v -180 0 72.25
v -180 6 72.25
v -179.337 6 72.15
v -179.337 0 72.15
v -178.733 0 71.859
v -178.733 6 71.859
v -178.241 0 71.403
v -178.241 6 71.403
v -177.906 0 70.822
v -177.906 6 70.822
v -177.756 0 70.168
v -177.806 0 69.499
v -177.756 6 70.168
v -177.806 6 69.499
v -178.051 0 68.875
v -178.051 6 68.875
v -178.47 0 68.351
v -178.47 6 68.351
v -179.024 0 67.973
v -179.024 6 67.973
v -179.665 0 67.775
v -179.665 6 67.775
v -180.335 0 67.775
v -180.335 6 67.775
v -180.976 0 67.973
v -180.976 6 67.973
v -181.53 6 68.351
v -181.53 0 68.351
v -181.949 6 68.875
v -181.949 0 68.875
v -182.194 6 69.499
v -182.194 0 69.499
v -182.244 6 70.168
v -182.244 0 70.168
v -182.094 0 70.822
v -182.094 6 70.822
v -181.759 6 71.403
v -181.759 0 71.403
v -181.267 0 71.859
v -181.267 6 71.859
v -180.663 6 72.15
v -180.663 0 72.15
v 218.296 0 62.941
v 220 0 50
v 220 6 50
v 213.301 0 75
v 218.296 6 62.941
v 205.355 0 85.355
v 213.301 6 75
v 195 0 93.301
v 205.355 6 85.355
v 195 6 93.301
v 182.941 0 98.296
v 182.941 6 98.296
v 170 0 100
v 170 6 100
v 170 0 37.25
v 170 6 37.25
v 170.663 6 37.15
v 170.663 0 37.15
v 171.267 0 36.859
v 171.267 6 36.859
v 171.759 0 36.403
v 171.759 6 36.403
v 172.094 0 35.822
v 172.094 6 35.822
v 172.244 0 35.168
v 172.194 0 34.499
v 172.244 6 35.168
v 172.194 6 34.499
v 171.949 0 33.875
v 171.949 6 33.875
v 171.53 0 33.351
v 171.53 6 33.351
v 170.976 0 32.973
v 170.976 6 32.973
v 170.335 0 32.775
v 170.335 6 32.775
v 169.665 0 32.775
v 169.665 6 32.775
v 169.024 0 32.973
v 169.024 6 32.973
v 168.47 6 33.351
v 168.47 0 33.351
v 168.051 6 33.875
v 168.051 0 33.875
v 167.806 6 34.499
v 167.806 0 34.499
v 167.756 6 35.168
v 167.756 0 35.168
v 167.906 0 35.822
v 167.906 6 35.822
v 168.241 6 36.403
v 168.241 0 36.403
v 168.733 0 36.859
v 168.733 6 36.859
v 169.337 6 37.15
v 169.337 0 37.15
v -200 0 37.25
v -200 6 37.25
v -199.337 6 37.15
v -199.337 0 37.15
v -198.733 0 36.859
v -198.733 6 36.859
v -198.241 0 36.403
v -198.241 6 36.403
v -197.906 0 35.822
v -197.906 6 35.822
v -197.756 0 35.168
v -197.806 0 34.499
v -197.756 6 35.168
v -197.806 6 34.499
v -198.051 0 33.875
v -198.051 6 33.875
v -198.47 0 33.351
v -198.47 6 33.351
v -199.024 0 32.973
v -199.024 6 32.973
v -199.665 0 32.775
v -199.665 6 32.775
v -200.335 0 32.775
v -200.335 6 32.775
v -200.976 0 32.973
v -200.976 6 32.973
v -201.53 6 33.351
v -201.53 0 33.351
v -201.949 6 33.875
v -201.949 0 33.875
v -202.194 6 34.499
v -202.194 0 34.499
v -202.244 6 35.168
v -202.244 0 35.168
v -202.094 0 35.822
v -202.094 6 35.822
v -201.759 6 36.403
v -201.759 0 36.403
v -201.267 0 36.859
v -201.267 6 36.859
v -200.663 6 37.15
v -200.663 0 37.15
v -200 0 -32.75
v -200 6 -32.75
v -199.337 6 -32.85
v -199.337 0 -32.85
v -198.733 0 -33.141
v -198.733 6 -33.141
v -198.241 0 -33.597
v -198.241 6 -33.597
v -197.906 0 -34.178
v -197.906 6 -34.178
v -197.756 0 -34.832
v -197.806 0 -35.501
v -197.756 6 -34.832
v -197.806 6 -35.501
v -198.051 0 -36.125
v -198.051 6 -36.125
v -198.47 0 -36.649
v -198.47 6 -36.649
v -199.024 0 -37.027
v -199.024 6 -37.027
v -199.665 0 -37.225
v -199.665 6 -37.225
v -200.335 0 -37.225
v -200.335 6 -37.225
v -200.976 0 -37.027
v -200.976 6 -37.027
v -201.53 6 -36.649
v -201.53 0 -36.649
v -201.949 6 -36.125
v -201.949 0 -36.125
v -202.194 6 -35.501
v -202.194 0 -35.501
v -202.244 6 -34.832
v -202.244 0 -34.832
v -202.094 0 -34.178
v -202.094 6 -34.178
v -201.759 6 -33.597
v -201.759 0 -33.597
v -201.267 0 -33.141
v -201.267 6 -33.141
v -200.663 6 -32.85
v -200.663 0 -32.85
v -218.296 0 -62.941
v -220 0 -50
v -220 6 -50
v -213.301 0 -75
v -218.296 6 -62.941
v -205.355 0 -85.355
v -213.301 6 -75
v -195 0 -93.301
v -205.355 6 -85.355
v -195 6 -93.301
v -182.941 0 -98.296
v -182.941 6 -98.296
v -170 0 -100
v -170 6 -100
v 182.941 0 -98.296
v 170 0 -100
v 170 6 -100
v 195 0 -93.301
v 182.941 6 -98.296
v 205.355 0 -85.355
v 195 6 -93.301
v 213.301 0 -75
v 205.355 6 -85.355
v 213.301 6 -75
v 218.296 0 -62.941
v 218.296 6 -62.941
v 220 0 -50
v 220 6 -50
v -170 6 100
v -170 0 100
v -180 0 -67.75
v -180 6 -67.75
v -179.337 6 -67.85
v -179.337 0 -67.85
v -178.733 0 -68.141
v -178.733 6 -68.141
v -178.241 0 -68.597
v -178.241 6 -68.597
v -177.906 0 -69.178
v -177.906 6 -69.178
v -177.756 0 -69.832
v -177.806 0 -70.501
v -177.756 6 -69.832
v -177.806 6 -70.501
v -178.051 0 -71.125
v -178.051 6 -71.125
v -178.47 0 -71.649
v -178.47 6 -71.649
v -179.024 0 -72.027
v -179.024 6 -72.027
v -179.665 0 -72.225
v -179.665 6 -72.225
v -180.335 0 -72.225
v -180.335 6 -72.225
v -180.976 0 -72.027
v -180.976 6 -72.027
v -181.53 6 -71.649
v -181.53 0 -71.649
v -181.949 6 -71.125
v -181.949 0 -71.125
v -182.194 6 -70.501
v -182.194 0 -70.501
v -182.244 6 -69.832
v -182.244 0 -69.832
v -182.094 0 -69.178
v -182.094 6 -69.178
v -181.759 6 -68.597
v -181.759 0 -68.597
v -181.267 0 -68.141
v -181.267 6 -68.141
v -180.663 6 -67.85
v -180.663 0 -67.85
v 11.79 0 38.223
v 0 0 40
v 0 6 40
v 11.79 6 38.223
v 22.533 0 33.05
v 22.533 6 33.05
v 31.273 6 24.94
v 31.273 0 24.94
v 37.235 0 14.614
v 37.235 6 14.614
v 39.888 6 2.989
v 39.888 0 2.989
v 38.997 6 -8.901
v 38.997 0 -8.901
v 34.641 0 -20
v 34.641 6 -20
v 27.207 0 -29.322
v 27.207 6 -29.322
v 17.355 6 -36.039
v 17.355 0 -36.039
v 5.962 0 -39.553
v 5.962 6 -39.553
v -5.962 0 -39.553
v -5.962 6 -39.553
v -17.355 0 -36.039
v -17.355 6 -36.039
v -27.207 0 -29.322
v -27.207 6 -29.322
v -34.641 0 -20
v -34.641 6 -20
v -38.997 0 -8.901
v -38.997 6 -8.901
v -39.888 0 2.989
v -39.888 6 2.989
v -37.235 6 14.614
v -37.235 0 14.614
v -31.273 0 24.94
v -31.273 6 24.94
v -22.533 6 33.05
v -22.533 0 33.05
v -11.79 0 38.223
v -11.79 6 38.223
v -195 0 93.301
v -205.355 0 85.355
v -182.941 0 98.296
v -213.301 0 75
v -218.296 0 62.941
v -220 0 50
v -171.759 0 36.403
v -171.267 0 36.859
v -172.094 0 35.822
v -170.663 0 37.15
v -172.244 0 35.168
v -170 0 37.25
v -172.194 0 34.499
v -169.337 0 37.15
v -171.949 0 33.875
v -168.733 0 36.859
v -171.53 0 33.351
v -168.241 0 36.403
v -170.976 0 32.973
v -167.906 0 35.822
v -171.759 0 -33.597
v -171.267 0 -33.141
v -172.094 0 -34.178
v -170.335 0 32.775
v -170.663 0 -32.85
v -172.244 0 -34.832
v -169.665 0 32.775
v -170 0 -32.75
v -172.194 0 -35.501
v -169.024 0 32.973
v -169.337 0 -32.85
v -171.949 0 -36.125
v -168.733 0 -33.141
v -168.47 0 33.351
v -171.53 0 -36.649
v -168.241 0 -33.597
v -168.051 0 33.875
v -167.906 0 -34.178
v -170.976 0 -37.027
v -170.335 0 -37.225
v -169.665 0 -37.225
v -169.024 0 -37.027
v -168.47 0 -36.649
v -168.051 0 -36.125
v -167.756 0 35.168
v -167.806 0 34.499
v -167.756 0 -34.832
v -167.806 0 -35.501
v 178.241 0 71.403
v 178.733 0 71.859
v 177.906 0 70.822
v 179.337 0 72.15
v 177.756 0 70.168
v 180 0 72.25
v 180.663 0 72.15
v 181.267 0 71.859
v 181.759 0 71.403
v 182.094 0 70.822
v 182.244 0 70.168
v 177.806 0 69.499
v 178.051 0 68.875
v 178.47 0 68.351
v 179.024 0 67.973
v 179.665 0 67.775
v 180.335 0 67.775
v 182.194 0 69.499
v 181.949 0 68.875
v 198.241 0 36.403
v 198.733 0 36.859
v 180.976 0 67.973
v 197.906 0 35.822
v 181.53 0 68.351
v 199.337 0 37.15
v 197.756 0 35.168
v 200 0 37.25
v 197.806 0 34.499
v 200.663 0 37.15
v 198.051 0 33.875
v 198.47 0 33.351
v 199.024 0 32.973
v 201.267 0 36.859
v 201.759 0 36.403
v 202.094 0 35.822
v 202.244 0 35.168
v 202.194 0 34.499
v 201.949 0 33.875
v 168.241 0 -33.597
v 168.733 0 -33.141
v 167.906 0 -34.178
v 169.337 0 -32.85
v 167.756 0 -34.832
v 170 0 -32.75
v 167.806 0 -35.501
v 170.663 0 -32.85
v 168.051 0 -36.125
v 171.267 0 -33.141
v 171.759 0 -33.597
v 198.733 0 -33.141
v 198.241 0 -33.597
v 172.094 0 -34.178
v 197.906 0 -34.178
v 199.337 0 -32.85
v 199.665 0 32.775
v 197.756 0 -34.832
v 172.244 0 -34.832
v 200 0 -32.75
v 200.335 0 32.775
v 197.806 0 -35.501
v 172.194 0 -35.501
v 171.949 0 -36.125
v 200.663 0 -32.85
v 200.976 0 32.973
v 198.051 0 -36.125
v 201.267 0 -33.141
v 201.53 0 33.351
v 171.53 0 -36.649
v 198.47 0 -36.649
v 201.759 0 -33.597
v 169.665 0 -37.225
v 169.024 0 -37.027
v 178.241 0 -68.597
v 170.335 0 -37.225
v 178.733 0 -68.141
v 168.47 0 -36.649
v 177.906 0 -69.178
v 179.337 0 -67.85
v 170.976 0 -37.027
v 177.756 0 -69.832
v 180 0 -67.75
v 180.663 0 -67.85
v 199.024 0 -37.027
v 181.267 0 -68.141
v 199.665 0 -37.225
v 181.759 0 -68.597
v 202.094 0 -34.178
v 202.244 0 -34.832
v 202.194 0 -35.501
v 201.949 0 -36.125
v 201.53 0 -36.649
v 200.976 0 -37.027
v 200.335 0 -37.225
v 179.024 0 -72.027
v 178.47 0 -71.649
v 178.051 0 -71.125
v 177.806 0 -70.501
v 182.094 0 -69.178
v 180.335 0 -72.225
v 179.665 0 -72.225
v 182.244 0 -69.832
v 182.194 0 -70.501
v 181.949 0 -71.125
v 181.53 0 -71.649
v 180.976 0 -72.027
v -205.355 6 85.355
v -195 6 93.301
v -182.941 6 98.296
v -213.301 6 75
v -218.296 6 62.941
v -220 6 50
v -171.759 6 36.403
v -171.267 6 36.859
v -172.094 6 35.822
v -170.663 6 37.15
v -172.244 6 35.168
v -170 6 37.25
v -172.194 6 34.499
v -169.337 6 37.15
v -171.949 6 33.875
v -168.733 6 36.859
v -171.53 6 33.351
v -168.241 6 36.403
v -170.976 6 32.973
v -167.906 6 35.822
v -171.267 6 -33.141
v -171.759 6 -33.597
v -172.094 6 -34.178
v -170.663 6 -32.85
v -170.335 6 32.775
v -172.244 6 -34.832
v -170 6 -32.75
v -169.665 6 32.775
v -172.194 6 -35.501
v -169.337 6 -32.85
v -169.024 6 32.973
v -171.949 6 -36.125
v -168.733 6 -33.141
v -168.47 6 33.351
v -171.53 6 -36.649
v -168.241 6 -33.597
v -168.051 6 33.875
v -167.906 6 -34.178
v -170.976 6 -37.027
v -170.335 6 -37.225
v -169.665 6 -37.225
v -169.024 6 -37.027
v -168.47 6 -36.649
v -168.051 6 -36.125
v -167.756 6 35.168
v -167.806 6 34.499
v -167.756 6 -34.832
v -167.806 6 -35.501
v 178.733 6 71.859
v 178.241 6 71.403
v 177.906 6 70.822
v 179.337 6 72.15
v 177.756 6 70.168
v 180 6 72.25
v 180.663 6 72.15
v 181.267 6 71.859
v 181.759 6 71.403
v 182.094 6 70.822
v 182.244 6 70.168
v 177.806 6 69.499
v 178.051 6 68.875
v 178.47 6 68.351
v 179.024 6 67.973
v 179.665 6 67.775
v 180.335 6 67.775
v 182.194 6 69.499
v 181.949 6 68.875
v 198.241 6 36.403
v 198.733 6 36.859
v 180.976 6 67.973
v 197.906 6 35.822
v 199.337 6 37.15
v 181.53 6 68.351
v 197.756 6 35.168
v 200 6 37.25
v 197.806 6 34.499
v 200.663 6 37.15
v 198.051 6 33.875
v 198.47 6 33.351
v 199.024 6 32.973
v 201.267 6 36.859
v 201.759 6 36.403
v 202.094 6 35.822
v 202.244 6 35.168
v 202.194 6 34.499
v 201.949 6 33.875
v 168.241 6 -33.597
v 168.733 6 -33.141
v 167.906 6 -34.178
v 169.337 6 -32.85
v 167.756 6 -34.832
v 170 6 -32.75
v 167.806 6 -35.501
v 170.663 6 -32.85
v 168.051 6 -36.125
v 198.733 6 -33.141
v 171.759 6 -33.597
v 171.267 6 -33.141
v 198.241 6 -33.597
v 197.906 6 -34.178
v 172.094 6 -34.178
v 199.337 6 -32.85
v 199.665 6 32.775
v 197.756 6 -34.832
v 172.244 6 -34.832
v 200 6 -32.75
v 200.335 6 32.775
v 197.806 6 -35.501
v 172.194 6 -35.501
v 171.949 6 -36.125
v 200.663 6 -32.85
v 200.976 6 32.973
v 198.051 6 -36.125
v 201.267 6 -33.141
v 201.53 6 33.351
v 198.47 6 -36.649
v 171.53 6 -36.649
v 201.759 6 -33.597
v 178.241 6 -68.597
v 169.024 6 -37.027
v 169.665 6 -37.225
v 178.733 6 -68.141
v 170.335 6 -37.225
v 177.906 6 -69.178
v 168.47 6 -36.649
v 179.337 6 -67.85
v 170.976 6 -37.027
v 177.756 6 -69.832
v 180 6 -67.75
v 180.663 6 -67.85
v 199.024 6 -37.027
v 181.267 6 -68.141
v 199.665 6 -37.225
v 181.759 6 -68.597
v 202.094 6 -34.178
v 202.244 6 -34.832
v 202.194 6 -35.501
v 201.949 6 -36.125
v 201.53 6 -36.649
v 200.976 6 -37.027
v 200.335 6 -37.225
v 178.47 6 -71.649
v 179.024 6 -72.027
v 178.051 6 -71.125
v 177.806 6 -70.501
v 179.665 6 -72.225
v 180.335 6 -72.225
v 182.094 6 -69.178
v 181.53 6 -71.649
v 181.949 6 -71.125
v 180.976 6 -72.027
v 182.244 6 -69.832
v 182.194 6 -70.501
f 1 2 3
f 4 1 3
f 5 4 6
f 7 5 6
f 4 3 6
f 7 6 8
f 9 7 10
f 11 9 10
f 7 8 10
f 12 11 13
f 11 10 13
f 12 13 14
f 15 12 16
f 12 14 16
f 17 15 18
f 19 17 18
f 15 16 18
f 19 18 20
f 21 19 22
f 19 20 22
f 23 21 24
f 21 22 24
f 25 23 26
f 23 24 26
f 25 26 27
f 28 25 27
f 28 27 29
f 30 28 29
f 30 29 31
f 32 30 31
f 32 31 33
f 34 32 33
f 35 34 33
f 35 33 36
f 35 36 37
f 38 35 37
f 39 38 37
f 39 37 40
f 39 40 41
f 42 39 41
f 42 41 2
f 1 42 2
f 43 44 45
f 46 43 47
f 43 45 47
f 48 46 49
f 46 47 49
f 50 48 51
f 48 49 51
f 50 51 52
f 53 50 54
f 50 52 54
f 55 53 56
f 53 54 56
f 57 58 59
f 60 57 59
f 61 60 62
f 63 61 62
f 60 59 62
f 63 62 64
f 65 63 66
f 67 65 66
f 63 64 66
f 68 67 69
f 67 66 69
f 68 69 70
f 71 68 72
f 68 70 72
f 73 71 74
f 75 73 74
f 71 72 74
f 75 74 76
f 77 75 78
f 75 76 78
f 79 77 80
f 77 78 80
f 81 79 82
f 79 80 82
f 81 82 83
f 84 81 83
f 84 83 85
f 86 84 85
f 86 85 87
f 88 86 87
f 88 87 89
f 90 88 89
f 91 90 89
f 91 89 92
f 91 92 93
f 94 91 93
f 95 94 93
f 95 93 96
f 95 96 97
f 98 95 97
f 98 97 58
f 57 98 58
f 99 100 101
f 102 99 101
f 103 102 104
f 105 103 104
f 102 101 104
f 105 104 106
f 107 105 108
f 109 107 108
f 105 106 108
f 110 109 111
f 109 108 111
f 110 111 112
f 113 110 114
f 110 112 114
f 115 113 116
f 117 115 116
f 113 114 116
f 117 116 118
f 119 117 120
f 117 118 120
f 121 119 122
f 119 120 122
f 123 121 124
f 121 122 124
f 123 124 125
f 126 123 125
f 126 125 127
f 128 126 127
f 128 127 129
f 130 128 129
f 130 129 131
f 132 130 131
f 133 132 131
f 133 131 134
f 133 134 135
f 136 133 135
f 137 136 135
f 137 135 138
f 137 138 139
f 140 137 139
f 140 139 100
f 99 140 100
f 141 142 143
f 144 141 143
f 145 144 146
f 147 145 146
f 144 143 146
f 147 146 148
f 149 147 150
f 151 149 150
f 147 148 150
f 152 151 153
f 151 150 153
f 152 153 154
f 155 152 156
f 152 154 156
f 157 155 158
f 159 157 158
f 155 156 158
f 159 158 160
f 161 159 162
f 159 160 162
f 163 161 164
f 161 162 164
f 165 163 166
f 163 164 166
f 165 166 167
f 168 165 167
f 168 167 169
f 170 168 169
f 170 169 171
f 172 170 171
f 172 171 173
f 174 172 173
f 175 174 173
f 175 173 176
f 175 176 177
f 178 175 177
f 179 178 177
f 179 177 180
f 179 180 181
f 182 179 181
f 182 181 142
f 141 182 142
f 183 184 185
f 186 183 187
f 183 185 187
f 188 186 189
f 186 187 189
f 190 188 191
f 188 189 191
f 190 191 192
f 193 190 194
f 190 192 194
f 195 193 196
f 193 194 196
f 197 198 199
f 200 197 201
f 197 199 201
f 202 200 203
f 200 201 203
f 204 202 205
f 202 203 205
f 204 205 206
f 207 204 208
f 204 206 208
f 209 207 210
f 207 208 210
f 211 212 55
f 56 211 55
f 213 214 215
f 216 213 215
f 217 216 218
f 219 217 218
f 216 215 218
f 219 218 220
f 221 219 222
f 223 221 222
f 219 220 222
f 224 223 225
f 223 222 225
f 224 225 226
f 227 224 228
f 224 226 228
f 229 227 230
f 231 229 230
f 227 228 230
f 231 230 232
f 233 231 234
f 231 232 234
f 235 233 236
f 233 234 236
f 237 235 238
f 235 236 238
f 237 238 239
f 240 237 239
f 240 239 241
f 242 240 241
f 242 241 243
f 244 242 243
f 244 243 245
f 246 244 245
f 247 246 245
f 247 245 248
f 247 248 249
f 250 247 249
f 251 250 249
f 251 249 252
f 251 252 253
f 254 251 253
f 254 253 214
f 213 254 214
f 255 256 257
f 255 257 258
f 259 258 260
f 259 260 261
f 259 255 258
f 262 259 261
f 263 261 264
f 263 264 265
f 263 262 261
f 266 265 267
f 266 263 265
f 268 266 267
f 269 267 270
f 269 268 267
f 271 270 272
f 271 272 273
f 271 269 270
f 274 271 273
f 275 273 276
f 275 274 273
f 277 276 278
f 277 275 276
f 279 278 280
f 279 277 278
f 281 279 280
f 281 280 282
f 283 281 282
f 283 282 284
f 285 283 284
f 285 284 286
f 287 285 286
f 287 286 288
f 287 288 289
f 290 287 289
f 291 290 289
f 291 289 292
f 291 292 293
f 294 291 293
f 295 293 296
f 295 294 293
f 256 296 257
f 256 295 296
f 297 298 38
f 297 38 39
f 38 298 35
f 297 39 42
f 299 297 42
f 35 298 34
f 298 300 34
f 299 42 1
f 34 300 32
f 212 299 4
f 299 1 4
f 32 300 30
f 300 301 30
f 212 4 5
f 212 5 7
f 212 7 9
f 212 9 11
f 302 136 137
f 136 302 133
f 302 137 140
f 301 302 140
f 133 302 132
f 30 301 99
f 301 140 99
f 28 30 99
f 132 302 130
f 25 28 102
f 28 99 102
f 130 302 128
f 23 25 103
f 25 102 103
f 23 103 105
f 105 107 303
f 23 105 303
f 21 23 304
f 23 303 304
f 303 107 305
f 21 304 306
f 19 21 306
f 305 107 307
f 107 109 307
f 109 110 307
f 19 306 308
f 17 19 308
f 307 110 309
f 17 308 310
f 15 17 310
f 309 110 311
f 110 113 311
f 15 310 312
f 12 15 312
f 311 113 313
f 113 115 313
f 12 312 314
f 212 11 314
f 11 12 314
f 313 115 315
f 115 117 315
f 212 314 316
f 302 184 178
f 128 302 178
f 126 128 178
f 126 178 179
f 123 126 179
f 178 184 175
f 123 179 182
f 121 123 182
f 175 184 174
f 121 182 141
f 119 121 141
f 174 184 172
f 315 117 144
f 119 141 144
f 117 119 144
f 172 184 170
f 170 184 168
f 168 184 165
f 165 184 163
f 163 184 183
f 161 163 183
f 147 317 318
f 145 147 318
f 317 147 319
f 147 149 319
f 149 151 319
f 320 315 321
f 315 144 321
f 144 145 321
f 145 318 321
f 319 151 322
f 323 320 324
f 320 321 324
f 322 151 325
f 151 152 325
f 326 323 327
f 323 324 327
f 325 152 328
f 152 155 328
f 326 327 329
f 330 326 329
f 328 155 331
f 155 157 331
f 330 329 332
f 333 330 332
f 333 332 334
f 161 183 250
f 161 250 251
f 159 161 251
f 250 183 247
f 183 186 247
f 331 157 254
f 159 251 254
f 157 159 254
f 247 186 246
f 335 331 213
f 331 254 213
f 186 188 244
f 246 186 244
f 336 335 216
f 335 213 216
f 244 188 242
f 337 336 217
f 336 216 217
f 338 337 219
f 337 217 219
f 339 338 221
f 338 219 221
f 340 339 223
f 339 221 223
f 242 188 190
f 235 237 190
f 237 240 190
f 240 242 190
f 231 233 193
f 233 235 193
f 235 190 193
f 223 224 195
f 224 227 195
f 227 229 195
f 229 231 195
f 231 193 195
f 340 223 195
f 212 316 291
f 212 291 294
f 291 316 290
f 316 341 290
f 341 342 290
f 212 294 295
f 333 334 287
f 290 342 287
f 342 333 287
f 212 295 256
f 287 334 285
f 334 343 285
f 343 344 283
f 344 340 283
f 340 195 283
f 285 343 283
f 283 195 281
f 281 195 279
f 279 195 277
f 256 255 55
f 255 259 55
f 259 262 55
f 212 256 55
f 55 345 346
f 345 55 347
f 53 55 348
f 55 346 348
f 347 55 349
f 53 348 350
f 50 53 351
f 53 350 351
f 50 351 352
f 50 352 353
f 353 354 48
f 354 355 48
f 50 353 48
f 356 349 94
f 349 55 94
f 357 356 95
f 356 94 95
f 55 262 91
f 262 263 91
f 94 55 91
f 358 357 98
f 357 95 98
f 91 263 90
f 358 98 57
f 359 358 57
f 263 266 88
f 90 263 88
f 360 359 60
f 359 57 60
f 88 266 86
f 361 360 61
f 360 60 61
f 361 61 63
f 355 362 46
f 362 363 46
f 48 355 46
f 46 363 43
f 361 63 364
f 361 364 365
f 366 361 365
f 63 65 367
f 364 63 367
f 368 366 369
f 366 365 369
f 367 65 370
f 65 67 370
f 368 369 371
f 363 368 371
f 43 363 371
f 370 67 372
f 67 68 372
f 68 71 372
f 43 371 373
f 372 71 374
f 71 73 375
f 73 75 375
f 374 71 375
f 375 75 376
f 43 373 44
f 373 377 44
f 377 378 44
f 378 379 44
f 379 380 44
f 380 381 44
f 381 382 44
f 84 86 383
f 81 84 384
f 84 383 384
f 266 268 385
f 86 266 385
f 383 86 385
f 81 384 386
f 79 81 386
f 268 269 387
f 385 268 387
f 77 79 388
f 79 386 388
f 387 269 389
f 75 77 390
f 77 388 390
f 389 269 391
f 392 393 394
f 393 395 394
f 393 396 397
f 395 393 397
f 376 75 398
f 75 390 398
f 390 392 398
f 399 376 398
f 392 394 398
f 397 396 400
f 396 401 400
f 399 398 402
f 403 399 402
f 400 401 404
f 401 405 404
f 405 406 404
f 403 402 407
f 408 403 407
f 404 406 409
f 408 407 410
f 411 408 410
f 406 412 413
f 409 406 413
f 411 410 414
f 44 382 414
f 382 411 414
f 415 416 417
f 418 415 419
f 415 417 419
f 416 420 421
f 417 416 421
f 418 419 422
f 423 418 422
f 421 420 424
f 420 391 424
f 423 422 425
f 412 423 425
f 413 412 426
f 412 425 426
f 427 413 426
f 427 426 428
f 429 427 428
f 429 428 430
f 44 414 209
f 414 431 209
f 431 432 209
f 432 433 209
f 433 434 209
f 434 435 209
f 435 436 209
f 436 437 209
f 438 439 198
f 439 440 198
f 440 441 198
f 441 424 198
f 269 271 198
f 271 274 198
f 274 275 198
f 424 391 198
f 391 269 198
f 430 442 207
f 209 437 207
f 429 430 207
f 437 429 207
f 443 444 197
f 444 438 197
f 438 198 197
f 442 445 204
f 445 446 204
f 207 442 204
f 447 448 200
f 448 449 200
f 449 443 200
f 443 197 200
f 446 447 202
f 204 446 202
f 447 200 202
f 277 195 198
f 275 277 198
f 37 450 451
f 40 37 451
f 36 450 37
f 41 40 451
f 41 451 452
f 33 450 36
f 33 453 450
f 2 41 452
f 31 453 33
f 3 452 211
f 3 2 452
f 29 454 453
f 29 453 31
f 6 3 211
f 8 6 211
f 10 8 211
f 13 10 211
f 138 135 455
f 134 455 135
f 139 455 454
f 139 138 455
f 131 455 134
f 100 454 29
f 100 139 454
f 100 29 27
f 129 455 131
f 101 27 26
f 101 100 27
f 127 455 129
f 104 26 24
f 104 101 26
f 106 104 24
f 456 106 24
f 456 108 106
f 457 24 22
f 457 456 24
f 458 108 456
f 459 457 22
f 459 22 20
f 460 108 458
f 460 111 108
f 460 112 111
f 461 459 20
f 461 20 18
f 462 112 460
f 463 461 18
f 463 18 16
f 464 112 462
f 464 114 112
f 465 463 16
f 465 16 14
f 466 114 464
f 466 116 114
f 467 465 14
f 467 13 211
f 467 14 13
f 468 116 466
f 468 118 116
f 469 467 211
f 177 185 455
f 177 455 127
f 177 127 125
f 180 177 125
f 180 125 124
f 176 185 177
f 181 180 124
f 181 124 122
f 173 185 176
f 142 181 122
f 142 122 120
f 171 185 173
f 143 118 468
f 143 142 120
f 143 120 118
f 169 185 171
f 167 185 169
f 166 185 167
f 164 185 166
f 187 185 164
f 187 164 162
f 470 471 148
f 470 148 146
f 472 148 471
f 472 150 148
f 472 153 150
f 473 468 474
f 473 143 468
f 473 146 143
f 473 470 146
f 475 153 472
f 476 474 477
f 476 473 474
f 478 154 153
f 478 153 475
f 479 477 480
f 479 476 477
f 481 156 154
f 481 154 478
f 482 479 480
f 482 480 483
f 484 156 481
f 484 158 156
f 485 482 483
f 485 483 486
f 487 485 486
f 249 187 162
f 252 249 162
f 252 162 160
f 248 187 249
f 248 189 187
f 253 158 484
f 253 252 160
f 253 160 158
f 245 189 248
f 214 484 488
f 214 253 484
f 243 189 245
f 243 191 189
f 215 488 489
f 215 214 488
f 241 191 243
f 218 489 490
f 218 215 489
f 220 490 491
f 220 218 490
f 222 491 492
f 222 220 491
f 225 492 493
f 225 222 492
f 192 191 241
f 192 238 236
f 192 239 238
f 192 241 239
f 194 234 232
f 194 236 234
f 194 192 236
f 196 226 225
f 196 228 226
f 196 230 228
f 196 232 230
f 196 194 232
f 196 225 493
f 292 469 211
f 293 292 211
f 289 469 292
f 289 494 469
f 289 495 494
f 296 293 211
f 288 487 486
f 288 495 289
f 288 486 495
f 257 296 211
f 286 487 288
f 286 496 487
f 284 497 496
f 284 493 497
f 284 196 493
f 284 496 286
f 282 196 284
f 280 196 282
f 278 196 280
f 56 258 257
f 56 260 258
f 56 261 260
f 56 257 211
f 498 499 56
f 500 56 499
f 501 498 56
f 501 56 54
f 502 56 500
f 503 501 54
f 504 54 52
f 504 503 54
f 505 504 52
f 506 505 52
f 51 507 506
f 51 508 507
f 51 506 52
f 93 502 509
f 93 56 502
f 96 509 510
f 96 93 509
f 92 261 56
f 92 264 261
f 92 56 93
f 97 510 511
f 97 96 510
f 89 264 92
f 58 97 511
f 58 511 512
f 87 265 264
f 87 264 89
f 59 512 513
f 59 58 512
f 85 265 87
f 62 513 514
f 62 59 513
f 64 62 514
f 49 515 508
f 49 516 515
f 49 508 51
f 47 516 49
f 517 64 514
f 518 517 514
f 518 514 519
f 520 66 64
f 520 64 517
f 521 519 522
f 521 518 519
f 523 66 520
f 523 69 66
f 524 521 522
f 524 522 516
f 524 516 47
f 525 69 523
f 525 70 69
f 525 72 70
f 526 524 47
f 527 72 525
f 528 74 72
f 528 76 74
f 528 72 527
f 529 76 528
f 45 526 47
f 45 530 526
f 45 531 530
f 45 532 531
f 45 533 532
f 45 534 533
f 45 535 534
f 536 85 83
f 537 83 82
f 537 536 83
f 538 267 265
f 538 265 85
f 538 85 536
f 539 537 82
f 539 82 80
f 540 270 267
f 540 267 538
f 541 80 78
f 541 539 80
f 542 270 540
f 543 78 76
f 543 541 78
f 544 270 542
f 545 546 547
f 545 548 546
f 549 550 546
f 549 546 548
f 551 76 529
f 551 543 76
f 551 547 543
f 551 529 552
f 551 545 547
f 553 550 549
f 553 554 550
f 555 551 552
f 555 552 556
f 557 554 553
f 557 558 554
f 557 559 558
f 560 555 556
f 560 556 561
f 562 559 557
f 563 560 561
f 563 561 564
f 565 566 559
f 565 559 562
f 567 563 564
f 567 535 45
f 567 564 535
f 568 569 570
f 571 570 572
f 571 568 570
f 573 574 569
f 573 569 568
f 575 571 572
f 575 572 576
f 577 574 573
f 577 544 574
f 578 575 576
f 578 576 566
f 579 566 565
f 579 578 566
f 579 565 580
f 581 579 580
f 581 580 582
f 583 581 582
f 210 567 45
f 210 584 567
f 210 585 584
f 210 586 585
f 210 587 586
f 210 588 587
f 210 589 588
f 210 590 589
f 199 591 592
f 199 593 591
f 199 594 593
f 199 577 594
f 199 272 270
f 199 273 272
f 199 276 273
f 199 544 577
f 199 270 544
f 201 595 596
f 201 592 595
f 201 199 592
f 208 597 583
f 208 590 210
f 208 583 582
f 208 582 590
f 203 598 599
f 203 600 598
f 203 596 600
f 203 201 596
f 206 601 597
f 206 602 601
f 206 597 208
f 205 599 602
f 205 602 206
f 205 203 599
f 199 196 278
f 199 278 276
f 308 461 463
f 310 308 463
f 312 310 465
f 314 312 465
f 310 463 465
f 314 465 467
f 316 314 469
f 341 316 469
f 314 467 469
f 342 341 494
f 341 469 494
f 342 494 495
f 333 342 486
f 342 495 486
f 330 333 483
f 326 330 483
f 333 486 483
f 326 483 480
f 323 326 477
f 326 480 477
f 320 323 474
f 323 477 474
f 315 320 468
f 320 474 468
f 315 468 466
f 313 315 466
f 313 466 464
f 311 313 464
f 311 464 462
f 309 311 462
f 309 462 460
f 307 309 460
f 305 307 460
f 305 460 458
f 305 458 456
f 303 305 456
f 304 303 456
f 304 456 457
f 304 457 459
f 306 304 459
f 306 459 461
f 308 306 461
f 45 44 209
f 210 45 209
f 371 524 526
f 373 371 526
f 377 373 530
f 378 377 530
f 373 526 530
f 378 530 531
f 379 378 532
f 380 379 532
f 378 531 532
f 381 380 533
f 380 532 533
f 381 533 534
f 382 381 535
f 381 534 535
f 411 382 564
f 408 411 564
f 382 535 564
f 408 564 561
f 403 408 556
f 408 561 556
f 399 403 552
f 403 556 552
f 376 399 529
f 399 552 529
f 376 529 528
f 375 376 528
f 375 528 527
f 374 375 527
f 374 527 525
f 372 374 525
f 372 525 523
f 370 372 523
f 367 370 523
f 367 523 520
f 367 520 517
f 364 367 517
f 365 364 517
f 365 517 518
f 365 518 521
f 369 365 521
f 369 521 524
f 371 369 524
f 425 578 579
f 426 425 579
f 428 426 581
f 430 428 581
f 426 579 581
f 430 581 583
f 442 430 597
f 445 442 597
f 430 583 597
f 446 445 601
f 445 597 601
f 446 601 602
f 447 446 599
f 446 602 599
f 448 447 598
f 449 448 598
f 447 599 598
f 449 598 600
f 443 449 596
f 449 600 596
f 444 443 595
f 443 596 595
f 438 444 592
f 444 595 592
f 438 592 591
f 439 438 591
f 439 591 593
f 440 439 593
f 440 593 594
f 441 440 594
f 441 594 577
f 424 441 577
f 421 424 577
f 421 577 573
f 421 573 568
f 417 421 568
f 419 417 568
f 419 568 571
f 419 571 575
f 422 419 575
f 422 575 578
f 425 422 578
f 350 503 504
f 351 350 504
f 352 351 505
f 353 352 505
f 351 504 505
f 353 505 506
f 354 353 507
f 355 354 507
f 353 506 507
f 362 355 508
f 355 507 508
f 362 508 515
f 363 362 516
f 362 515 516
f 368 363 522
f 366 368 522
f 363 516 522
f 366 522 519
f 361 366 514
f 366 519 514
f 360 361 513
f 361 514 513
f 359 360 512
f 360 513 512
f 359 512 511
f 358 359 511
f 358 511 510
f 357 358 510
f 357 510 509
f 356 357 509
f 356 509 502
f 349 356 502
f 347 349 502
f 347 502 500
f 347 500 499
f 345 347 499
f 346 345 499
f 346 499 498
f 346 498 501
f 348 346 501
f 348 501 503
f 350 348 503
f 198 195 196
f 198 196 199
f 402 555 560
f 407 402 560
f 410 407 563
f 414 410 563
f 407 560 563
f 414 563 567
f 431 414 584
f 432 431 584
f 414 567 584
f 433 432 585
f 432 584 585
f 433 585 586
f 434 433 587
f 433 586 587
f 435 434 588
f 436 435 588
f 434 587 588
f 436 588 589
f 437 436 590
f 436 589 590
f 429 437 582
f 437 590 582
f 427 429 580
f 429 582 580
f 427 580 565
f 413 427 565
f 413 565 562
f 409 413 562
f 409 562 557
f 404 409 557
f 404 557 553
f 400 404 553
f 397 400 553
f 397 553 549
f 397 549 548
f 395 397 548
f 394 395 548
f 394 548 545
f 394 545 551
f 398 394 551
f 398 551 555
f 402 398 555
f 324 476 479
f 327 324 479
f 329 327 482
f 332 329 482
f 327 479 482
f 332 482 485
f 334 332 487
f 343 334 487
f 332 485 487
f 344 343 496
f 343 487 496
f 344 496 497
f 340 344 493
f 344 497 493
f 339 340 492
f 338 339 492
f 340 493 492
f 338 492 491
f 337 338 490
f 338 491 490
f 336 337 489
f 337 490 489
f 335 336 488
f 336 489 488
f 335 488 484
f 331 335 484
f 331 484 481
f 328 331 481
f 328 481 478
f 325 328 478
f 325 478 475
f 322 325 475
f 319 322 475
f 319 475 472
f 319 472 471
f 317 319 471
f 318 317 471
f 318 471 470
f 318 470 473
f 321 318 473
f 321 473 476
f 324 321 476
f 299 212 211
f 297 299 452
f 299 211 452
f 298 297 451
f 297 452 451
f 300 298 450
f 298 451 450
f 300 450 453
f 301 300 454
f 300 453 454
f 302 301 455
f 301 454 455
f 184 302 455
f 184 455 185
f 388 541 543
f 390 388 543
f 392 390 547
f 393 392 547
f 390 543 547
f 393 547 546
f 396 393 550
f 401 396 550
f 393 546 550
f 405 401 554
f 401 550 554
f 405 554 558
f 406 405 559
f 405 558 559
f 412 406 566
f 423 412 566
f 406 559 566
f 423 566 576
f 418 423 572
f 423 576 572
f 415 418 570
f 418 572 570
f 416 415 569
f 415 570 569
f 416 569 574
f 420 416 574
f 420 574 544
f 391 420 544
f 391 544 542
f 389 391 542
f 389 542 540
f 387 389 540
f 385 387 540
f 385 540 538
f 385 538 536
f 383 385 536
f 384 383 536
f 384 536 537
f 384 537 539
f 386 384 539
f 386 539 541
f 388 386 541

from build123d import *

# Parameters (mm, degrees)
SKETCH_6_W          = 440
SKETCH_6_H          = 200
SKETCH_6_R          = 40
EXTRUDE_2_DEPTH     = 6
SKETCH_7_R          = 2.25
CUT_EXTRUDE_1_DEPTH = 10


with BuildPart() as part:
    # 草图6 → 凸台-拉伸2 (new body)
    with BuildSketch(Plane(origin=(0, 0, 0), x_dir=(1, 0, 0), z_dir=(0, 1, 0))):
        Rectangle(SKETCH_6_W, SKETCH_6_H)
        with Locations(Location((0, 0, 0), (0, 0, 270))):
            Circle(SKETCH_6_R, mode=Mode.SUBTRACT)
    extrude(amount=EXTRUDE_2_DEPTH)

    # 草图7 → 切除-拉伸1 (cut)
    with BuildSketch(Plane(origin=(0, 6, 0), x_dir=(1, 0, 0), z_dir=(0, 1, 0))):
        with BuildLine():
            Line((-220, 100), (-220, 50))
            ThreePointArc((-220, 50), (-205.355339059, 85.355339059), (-170, 100))
            Line((-170, 100), (-220, 100))
        make_face()
        with BuildLine():
            ThreePointArc((-170, -100), (-205.355339059, -85.355339059), (-220, -50))
            Line((-220, -50), (-220, -100))
            Line((-220, -100), (-170, -100))
        make_face()
        with BuildLine():
            Line((220, 100), (170, 100))
            ThreePointArc((170, 100), (205.355339059, 85.355339059), (220, 50))
            Line((220, 50), (220, 100))
        make_face()
        with BuildLine():
            ThreePointArc((220, -50), (205.355339059, -85.355339059), (170, -100))
            Line((170, -100), (220, -100))
            Line((220, -100), (220, -50))
        make_face()
        with Locations(Location((170, 35, 0), (0, 0, 270))):
            Circle(SKETCH_7_R)
        with Locations(Location((200, 35, 0), (0, 0, 270))):
            Circle(SKETCH_7_R)
        with Locations(Location((180, 70, 0), (0, 0, 270))):
            Circle(SKETCH_7_R)
        with Locations(Location((-180, 70, 0), (0, 0, 270))):
            Circle(SKETCH_7_R)
        with Locations(Location((-200, 35, 0), (0, 0, 270))):
            Circle(SKETCH_7_R)
        with Locations(Location((-170, 35, 0), (0, 0, 270))):
            Circle(SKETCH_7_R)
        with Locations(Location((-170, -35, 0), (0, 0, 270))):
            Circle(SKETCH_7_R)
        with Locations(Location((-200, -35, 0), (0, 0, 270))):
            Circle(SKETCH_7_R)
        with Locations(Location((-180, -70, 0), (0, 0, 270))):
            Circle(SKETCH_7_R)
        with Locations(Location((180, -70, 0), (0, 0, 270))):
            Circle(SKETCH_7_R)
        with Locations(Location((200, -35, 0), (0, 0, 270))):
            Circle(SKETCH_7_R)
        with Locations(Location((170, -35, 0), (0, 0, 270))):
            Circle(SKETCH_7_R)
    extrude(amount=-CUT_EXTRUDE_1_DEPTH, mode=Mode.SUBTRACT)


solid = part.part
